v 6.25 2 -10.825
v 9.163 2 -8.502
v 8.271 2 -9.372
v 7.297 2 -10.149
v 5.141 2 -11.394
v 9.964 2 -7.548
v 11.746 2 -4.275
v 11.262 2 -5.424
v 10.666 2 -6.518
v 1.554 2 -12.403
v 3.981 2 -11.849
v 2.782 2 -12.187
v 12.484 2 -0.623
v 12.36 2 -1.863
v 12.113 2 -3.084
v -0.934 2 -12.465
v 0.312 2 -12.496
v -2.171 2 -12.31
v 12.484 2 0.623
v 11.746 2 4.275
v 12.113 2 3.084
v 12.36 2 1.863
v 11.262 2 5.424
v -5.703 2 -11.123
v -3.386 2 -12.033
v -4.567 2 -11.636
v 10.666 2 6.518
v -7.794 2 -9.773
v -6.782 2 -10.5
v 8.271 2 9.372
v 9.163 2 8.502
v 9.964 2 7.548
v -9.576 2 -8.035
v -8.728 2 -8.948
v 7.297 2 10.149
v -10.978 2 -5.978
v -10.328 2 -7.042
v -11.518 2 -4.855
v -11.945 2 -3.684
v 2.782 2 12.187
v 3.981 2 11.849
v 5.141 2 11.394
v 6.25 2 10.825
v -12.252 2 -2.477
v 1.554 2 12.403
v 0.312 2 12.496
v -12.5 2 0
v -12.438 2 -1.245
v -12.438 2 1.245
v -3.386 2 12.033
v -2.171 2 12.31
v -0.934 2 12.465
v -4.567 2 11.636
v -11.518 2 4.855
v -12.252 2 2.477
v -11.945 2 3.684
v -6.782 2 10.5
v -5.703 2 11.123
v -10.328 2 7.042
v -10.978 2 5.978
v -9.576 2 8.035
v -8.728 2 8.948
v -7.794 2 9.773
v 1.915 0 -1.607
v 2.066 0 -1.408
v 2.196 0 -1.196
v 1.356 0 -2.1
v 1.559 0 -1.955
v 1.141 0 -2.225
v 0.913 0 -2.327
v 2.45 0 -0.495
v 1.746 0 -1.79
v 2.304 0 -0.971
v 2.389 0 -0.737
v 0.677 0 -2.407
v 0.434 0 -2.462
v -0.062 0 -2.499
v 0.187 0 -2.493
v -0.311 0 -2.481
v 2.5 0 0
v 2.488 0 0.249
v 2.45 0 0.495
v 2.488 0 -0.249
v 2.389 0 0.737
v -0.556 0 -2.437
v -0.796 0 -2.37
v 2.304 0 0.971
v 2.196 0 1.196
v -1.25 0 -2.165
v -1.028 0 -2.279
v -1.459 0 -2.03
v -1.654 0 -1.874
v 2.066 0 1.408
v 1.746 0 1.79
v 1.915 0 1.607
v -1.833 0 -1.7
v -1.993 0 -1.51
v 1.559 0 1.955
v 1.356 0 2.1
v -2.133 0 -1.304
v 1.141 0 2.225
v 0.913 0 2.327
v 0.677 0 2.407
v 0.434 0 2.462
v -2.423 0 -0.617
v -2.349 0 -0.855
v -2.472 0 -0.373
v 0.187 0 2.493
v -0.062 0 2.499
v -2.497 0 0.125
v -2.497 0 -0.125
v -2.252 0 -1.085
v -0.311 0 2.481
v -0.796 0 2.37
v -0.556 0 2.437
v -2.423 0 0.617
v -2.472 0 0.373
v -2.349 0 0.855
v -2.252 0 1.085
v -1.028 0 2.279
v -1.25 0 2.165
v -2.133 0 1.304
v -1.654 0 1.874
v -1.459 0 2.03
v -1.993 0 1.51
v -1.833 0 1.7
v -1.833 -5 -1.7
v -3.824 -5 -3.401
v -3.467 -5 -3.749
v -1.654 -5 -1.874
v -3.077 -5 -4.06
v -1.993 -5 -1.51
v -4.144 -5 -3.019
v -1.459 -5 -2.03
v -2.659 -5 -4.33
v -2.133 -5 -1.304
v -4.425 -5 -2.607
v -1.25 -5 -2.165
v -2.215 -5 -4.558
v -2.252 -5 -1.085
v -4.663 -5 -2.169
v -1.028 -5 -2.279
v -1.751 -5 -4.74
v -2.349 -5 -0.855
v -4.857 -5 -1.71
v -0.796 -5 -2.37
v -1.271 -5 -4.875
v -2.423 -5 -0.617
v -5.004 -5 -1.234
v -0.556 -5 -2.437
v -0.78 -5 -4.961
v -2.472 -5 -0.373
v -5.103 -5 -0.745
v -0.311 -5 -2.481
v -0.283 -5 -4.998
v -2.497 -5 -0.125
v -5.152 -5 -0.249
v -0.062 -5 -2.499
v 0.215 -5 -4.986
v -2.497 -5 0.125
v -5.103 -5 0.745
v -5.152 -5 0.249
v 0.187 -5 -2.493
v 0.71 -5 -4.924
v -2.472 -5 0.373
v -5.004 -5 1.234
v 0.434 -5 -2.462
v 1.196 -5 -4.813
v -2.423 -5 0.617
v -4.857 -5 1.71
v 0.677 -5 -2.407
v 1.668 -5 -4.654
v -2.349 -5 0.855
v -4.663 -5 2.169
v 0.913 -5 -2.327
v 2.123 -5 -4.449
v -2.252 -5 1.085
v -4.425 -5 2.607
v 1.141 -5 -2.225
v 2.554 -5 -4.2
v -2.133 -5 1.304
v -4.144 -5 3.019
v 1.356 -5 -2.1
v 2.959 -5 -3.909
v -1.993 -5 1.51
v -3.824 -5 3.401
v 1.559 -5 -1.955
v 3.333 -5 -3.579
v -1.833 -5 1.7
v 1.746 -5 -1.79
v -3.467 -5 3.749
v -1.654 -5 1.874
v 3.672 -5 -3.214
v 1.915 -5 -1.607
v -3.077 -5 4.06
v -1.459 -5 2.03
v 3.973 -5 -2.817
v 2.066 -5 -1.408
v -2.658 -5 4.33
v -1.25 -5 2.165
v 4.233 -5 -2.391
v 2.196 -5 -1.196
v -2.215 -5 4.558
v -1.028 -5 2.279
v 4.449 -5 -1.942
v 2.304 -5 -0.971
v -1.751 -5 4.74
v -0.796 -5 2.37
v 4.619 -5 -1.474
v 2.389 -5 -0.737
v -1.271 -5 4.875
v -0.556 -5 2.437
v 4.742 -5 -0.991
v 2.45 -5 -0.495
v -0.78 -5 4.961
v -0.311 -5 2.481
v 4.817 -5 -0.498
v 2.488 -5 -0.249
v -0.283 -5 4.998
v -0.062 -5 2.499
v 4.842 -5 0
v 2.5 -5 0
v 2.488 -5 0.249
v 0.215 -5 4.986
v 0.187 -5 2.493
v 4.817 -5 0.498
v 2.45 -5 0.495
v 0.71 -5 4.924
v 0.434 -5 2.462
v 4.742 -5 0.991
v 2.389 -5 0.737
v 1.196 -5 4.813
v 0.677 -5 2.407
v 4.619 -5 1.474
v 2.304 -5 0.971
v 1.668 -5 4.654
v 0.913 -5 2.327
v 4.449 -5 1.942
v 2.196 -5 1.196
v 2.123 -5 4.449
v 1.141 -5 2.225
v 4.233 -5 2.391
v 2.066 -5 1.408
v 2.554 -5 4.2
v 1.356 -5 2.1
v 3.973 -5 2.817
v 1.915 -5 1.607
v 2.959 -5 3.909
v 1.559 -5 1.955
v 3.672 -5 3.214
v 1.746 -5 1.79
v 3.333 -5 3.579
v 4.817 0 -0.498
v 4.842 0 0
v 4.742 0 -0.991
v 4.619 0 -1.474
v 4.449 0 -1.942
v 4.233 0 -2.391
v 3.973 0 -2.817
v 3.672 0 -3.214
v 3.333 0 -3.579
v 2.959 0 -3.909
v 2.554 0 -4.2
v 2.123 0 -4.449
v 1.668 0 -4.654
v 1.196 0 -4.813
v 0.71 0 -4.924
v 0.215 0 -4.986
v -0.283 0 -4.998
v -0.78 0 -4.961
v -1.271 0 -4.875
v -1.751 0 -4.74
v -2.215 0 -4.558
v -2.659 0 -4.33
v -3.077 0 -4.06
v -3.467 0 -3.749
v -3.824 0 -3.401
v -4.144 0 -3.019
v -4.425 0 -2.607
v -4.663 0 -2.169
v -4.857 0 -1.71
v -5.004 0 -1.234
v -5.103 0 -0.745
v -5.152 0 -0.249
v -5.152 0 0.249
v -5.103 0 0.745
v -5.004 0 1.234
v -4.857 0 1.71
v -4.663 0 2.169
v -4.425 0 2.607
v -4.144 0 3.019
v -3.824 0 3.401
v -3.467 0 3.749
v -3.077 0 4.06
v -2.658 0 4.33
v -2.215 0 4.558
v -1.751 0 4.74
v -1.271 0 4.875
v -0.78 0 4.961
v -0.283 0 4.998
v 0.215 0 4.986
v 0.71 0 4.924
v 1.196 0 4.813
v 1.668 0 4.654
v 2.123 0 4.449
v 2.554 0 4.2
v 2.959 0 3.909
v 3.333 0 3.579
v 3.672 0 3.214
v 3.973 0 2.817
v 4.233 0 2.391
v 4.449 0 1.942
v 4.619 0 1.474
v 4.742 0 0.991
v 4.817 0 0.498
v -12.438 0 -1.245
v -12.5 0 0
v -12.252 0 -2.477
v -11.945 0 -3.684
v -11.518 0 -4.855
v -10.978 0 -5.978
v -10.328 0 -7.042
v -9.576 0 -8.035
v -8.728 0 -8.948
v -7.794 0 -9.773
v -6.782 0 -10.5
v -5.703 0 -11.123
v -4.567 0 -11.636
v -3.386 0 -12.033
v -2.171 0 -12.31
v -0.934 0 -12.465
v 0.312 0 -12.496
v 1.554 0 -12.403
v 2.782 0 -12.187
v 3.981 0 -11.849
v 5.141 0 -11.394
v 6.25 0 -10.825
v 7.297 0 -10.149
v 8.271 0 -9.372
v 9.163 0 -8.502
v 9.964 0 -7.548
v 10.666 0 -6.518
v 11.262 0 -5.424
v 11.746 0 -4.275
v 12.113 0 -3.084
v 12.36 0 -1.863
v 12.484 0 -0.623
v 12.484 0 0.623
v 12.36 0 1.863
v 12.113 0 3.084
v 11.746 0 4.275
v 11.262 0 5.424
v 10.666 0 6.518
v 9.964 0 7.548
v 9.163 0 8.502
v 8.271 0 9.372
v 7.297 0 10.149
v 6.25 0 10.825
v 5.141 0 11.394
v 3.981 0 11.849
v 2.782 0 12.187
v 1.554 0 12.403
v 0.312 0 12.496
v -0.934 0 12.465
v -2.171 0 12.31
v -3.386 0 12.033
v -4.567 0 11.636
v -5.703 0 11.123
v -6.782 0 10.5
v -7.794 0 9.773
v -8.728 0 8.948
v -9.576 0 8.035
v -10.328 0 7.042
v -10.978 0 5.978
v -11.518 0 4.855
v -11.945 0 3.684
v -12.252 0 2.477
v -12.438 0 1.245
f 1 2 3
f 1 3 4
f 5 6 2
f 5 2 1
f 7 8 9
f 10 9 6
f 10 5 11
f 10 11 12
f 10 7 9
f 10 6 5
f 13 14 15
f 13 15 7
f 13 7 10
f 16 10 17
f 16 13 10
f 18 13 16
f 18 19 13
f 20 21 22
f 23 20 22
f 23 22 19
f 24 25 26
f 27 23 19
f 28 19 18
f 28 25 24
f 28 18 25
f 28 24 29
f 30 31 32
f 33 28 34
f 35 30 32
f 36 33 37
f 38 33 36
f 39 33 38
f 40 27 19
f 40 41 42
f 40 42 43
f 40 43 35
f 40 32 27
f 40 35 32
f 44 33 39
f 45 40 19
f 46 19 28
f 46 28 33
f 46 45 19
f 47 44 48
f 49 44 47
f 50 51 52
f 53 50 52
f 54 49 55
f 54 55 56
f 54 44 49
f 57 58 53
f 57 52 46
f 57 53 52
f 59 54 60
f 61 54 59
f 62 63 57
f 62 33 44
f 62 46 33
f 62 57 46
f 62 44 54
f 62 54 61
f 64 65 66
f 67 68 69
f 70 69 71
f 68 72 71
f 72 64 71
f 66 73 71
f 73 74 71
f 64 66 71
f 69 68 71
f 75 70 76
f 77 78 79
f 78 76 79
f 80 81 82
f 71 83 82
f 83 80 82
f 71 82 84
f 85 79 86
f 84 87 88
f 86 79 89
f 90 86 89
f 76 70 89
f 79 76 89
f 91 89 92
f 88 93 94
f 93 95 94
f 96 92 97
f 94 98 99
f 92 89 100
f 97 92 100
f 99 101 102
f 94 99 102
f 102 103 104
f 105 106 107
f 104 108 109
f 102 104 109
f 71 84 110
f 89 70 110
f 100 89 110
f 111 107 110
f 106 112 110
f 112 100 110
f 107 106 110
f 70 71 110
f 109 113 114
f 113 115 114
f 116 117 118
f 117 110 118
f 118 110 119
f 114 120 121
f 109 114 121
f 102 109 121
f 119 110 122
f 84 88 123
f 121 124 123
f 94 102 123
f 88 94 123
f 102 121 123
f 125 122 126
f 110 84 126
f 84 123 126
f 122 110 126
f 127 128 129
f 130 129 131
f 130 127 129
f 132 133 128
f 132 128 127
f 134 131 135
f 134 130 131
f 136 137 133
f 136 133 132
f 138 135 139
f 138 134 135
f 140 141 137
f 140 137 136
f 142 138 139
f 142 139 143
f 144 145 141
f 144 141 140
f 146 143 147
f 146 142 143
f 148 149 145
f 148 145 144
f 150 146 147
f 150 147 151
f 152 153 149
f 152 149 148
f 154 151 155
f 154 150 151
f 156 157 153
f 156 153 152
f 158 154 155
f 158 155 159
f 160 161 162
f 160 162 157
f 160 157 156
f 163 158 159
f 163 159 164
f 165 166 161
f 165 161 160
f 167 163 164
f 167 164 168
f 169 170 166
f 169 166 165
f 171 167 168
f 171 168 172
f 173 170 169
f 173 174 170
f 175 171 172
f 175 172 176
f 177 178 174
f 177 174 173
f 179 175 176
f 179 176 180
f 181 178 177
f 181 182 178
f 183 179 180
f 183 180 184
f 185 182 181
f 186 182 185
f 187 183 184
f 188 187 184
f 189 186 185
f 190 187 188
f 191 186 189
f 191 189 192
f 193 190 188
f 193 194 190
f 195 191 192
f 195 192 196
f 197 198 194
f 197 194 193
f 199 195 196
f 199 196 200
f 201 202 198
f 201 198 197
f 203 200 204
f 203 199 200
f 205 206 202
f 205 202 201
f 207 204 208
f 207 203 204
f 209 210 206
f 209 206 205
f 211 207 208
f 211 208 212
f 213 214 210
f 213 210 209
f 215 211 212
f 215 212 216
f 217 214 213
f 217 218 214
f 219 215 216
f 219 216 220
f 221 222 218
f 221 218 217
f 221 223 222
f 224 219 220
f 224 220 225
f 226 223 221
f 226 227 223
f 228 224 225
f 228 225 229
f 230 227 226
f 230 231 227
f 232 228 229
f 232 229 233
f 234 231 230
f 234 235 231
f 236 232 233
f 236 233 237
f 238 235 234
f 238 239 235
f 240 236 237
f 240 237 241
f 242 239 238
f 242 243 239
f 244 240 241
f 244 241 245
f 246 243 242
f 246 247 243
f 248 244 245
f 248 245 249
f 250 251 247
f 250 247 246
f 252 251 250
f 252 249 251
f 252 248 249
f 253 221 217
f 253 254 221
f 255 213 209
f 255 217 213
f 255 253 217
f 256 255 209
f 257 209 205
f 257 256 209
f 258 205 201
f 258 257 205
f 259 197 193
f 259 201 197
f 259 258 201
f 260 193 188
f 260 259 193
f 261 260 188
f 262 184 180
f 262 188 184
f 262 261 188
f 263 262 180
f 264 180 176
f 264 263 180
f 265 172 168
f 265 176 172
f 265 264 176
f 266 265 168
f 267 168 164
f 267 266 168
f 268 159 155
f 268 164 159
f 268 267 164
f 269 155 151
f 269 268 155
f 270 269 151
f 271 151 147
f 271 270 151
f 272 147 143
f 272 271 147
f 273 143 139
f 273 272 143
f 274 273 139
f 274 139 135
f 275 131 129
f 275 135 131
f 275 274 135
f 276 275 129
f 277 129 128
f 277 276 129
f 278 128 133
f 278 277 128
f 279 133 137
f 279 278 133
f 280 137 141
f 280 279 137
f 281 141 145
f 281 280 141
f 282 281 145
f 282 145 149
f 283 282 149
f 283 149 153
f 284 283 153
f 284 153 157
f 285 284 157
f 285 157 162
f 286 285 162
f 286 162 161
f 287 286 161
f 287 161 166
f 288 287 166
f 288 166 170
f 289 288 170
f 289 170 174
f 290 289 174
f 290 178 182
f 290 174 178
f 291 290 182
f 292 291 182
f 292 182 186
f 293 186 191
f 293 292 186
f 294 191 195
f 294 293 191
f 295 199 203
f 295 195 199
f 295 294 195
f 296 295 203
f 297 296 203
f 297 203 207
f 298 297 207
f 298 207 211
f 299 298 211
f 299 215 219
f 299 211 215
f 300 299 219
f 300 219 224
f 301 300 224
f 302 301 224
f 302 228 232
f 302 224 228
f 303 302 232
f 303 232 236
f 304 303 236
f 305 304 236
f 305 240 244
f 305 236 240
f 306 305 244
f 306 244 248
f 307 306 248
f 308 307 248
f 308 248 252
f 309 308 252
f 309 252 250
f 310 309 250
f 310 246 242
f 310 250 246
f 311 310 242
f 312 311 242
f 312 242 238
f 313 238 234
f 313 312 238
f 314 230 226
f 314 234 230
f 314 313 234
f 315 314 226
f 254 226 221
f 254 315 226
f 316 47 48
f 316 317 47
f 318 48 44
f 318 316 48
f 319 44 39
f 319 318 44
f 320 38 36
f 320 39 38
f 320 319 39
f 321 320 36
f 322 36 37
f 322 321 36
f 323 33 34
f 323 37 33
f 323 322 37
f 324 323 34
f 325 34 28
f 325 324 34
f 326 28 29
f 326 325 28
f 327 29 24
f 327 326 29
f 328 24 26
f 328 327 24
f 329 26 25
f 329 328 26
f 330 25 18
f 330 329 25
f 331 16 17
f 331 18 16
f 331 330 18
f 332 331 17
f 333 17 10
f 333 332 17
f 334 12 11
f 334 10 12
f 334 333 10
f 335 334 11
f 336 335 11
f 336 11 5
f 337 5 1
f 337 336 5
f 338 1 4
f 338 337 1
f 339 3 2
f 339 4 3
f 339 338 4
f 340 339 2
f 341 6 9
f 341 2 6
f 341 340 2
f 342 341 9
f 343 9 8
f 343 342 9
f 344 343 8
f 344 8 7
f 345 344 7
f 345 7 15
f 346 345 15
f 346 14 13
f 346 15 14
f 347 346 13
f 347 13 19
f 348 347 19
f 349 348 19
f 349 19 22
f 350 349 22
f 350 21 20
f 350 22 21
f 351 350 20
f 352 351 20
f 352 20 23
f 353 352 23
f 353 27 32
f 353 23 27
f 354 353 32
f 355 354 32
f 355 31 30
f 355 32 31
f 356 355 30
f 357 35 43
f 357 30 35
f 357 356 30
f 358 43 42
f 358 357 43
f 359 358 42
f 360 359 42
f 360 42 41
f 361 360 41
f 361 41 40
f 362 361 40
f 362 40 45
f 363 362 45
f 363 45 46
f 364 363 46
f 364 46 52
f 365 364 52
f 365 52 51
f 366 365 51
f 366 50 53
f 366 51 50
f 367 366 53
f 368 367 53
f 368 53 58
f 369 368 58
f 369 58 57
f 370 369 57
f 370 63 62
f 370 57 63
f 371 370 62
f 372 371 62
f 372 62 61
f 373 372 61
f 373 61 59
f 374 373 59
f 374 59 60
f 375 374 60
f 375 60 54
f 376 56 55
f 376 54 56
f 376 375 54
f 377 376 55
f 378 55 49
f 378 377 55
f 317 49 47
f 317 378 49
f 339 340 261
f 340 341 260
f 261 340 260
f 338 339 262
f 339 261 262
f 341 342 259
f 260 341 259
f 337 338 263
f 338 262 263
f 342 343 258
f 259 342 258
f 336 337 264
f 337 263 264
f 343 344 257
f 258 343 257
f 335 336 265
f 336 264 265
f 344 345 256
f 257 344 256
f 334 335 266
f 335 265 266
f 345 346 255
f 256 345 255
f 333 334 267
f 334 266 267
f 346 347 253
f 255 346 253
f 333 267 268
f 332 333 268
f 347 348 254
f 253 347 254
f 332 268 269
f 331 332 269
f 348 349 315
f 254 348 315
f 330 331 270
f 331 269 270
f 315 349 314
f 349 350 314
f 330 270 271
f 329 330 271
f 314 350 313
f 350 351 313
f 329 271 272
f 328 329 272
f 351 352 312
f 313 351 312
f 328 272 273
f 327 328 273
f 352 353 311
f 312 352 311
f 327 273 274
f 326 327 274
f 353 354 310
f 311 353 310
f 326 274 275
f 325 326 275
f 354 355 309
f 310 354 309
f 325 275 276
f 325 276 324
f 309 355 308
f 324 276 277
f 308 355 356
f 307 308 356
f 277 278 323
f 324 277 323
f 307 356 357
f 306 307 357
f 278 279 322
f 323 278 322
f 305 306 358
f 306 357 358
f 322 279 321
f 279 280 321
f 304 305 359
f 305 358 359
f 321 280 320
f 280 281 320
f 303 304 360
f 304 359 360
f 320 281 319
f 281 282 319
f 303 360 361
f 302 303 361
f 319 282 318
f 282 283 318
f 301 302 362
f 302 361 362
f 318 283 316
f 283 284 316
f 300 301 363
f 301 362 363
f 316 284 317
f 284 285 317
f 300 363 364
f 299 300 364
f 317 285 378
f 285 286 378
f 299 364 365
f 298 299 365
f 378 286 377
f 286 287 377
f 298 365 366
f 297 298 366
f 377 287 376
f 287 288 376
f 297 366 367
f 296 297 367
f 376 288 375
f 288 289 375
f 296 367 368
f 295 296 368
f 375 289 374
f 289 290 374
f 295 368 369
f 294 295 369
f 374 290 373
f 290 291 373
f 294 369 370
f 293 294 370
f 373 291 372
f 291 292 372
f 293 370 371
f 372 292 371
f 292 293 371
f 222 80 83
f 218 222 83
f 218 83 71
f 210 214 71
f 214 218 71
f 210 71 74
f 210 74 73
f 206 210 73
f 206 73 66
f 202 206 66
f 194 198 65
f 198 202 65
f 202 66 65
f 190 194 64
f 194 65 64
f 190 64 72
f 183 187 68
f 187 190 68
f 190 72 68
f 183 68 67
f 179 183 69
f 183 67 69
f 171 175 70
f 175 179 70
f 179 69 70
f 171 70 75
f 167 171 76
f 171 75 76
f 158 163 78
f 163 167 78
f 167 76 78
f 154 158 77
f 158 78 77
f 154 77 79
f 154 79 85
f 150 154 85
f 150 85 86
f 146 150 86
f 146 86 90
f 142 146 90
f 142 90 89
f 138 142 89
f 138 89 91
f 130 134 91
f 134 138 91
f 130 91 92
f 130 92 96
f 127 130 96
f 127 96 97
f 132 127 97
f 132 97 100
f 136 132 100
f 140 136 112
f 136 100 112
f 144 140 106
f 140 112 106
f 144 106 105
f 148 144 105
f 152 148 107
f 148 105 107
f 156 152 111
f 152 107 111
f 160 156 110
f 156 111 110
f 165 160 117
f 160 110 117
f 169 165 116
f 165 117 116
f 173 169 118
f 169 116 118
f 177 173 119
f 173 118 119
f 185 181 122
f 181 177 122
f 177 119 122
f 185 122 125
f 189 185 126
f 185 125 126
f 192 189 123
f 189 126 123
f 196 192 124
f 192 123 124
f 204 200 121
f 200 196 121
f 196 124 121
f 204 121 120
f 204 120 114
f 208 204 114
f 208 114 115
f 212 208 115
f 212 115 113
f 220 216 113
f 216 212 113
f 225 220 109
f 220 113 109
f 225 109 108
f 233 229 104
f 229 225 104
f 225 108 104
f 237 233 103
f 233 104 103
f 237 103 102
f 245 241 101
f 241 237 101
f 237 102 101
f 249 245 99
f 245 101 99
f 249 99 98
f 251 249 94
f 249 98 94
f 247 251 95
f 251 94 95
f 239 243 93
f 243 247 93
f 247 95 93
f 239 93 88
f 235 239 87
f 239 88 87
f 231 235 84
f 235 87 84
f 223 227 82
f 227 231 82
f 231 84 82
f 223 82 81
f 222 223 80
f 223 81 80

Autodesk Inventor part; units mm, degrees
ref_plane "YZ Plane" through (0, 0, 0) normal (1, 0, 0) x (0, 1, 0)
ref_plane "XZ Plane" through (0, 0, 0) normal (0, 1, 0) x (-1, 0, 0)
ref_plane "XY Plane" through (0, 0, 0) normal (0, 0, 1) x (1, 0, 0)
sketch "Sketch1" plane through (0, 0, 0) normal (0, 1, 0) x (-1, 0, 0)
  circle A0 centre (0, 0) radius 12.5
  dimension "d0" = 25
extrude "Extrusion1" add sketch "Sketch1" along normal blind 2
sketch "Sketch2" plane through (0, 0, 0) normal (0, -1, 0) x (1, 0, 0)
  circle A0 centre (0, 0) radius 2.5
  circle A1 centre (-0.1585, 0) radius 5
  dimension "d3" = 5
  dimension "d4" = 10
extrude "Extrusion2" add sketch "Sketch2" along normal blind 5
equation "\"BendRadius\" = Thickness"
equation "\"BendReliefWidth\" = Thickness"
equation "\"BendReliefDepth\" = 0.5 * Thickness"
equation "\"CornerReliefSize\" = 4 * Thickness"
equation "\"MinimumRemnant\" = 2 * Thickness"
equation "\"TransitionRadius\" = BendRadius"
equation "\"JacobiRadiusSize\" = BendRadius"
equation "\"GapSize\" = Thickness"
equation "\"Thickness\" = 0.5"
properties part number "Servo_bigg_top"
